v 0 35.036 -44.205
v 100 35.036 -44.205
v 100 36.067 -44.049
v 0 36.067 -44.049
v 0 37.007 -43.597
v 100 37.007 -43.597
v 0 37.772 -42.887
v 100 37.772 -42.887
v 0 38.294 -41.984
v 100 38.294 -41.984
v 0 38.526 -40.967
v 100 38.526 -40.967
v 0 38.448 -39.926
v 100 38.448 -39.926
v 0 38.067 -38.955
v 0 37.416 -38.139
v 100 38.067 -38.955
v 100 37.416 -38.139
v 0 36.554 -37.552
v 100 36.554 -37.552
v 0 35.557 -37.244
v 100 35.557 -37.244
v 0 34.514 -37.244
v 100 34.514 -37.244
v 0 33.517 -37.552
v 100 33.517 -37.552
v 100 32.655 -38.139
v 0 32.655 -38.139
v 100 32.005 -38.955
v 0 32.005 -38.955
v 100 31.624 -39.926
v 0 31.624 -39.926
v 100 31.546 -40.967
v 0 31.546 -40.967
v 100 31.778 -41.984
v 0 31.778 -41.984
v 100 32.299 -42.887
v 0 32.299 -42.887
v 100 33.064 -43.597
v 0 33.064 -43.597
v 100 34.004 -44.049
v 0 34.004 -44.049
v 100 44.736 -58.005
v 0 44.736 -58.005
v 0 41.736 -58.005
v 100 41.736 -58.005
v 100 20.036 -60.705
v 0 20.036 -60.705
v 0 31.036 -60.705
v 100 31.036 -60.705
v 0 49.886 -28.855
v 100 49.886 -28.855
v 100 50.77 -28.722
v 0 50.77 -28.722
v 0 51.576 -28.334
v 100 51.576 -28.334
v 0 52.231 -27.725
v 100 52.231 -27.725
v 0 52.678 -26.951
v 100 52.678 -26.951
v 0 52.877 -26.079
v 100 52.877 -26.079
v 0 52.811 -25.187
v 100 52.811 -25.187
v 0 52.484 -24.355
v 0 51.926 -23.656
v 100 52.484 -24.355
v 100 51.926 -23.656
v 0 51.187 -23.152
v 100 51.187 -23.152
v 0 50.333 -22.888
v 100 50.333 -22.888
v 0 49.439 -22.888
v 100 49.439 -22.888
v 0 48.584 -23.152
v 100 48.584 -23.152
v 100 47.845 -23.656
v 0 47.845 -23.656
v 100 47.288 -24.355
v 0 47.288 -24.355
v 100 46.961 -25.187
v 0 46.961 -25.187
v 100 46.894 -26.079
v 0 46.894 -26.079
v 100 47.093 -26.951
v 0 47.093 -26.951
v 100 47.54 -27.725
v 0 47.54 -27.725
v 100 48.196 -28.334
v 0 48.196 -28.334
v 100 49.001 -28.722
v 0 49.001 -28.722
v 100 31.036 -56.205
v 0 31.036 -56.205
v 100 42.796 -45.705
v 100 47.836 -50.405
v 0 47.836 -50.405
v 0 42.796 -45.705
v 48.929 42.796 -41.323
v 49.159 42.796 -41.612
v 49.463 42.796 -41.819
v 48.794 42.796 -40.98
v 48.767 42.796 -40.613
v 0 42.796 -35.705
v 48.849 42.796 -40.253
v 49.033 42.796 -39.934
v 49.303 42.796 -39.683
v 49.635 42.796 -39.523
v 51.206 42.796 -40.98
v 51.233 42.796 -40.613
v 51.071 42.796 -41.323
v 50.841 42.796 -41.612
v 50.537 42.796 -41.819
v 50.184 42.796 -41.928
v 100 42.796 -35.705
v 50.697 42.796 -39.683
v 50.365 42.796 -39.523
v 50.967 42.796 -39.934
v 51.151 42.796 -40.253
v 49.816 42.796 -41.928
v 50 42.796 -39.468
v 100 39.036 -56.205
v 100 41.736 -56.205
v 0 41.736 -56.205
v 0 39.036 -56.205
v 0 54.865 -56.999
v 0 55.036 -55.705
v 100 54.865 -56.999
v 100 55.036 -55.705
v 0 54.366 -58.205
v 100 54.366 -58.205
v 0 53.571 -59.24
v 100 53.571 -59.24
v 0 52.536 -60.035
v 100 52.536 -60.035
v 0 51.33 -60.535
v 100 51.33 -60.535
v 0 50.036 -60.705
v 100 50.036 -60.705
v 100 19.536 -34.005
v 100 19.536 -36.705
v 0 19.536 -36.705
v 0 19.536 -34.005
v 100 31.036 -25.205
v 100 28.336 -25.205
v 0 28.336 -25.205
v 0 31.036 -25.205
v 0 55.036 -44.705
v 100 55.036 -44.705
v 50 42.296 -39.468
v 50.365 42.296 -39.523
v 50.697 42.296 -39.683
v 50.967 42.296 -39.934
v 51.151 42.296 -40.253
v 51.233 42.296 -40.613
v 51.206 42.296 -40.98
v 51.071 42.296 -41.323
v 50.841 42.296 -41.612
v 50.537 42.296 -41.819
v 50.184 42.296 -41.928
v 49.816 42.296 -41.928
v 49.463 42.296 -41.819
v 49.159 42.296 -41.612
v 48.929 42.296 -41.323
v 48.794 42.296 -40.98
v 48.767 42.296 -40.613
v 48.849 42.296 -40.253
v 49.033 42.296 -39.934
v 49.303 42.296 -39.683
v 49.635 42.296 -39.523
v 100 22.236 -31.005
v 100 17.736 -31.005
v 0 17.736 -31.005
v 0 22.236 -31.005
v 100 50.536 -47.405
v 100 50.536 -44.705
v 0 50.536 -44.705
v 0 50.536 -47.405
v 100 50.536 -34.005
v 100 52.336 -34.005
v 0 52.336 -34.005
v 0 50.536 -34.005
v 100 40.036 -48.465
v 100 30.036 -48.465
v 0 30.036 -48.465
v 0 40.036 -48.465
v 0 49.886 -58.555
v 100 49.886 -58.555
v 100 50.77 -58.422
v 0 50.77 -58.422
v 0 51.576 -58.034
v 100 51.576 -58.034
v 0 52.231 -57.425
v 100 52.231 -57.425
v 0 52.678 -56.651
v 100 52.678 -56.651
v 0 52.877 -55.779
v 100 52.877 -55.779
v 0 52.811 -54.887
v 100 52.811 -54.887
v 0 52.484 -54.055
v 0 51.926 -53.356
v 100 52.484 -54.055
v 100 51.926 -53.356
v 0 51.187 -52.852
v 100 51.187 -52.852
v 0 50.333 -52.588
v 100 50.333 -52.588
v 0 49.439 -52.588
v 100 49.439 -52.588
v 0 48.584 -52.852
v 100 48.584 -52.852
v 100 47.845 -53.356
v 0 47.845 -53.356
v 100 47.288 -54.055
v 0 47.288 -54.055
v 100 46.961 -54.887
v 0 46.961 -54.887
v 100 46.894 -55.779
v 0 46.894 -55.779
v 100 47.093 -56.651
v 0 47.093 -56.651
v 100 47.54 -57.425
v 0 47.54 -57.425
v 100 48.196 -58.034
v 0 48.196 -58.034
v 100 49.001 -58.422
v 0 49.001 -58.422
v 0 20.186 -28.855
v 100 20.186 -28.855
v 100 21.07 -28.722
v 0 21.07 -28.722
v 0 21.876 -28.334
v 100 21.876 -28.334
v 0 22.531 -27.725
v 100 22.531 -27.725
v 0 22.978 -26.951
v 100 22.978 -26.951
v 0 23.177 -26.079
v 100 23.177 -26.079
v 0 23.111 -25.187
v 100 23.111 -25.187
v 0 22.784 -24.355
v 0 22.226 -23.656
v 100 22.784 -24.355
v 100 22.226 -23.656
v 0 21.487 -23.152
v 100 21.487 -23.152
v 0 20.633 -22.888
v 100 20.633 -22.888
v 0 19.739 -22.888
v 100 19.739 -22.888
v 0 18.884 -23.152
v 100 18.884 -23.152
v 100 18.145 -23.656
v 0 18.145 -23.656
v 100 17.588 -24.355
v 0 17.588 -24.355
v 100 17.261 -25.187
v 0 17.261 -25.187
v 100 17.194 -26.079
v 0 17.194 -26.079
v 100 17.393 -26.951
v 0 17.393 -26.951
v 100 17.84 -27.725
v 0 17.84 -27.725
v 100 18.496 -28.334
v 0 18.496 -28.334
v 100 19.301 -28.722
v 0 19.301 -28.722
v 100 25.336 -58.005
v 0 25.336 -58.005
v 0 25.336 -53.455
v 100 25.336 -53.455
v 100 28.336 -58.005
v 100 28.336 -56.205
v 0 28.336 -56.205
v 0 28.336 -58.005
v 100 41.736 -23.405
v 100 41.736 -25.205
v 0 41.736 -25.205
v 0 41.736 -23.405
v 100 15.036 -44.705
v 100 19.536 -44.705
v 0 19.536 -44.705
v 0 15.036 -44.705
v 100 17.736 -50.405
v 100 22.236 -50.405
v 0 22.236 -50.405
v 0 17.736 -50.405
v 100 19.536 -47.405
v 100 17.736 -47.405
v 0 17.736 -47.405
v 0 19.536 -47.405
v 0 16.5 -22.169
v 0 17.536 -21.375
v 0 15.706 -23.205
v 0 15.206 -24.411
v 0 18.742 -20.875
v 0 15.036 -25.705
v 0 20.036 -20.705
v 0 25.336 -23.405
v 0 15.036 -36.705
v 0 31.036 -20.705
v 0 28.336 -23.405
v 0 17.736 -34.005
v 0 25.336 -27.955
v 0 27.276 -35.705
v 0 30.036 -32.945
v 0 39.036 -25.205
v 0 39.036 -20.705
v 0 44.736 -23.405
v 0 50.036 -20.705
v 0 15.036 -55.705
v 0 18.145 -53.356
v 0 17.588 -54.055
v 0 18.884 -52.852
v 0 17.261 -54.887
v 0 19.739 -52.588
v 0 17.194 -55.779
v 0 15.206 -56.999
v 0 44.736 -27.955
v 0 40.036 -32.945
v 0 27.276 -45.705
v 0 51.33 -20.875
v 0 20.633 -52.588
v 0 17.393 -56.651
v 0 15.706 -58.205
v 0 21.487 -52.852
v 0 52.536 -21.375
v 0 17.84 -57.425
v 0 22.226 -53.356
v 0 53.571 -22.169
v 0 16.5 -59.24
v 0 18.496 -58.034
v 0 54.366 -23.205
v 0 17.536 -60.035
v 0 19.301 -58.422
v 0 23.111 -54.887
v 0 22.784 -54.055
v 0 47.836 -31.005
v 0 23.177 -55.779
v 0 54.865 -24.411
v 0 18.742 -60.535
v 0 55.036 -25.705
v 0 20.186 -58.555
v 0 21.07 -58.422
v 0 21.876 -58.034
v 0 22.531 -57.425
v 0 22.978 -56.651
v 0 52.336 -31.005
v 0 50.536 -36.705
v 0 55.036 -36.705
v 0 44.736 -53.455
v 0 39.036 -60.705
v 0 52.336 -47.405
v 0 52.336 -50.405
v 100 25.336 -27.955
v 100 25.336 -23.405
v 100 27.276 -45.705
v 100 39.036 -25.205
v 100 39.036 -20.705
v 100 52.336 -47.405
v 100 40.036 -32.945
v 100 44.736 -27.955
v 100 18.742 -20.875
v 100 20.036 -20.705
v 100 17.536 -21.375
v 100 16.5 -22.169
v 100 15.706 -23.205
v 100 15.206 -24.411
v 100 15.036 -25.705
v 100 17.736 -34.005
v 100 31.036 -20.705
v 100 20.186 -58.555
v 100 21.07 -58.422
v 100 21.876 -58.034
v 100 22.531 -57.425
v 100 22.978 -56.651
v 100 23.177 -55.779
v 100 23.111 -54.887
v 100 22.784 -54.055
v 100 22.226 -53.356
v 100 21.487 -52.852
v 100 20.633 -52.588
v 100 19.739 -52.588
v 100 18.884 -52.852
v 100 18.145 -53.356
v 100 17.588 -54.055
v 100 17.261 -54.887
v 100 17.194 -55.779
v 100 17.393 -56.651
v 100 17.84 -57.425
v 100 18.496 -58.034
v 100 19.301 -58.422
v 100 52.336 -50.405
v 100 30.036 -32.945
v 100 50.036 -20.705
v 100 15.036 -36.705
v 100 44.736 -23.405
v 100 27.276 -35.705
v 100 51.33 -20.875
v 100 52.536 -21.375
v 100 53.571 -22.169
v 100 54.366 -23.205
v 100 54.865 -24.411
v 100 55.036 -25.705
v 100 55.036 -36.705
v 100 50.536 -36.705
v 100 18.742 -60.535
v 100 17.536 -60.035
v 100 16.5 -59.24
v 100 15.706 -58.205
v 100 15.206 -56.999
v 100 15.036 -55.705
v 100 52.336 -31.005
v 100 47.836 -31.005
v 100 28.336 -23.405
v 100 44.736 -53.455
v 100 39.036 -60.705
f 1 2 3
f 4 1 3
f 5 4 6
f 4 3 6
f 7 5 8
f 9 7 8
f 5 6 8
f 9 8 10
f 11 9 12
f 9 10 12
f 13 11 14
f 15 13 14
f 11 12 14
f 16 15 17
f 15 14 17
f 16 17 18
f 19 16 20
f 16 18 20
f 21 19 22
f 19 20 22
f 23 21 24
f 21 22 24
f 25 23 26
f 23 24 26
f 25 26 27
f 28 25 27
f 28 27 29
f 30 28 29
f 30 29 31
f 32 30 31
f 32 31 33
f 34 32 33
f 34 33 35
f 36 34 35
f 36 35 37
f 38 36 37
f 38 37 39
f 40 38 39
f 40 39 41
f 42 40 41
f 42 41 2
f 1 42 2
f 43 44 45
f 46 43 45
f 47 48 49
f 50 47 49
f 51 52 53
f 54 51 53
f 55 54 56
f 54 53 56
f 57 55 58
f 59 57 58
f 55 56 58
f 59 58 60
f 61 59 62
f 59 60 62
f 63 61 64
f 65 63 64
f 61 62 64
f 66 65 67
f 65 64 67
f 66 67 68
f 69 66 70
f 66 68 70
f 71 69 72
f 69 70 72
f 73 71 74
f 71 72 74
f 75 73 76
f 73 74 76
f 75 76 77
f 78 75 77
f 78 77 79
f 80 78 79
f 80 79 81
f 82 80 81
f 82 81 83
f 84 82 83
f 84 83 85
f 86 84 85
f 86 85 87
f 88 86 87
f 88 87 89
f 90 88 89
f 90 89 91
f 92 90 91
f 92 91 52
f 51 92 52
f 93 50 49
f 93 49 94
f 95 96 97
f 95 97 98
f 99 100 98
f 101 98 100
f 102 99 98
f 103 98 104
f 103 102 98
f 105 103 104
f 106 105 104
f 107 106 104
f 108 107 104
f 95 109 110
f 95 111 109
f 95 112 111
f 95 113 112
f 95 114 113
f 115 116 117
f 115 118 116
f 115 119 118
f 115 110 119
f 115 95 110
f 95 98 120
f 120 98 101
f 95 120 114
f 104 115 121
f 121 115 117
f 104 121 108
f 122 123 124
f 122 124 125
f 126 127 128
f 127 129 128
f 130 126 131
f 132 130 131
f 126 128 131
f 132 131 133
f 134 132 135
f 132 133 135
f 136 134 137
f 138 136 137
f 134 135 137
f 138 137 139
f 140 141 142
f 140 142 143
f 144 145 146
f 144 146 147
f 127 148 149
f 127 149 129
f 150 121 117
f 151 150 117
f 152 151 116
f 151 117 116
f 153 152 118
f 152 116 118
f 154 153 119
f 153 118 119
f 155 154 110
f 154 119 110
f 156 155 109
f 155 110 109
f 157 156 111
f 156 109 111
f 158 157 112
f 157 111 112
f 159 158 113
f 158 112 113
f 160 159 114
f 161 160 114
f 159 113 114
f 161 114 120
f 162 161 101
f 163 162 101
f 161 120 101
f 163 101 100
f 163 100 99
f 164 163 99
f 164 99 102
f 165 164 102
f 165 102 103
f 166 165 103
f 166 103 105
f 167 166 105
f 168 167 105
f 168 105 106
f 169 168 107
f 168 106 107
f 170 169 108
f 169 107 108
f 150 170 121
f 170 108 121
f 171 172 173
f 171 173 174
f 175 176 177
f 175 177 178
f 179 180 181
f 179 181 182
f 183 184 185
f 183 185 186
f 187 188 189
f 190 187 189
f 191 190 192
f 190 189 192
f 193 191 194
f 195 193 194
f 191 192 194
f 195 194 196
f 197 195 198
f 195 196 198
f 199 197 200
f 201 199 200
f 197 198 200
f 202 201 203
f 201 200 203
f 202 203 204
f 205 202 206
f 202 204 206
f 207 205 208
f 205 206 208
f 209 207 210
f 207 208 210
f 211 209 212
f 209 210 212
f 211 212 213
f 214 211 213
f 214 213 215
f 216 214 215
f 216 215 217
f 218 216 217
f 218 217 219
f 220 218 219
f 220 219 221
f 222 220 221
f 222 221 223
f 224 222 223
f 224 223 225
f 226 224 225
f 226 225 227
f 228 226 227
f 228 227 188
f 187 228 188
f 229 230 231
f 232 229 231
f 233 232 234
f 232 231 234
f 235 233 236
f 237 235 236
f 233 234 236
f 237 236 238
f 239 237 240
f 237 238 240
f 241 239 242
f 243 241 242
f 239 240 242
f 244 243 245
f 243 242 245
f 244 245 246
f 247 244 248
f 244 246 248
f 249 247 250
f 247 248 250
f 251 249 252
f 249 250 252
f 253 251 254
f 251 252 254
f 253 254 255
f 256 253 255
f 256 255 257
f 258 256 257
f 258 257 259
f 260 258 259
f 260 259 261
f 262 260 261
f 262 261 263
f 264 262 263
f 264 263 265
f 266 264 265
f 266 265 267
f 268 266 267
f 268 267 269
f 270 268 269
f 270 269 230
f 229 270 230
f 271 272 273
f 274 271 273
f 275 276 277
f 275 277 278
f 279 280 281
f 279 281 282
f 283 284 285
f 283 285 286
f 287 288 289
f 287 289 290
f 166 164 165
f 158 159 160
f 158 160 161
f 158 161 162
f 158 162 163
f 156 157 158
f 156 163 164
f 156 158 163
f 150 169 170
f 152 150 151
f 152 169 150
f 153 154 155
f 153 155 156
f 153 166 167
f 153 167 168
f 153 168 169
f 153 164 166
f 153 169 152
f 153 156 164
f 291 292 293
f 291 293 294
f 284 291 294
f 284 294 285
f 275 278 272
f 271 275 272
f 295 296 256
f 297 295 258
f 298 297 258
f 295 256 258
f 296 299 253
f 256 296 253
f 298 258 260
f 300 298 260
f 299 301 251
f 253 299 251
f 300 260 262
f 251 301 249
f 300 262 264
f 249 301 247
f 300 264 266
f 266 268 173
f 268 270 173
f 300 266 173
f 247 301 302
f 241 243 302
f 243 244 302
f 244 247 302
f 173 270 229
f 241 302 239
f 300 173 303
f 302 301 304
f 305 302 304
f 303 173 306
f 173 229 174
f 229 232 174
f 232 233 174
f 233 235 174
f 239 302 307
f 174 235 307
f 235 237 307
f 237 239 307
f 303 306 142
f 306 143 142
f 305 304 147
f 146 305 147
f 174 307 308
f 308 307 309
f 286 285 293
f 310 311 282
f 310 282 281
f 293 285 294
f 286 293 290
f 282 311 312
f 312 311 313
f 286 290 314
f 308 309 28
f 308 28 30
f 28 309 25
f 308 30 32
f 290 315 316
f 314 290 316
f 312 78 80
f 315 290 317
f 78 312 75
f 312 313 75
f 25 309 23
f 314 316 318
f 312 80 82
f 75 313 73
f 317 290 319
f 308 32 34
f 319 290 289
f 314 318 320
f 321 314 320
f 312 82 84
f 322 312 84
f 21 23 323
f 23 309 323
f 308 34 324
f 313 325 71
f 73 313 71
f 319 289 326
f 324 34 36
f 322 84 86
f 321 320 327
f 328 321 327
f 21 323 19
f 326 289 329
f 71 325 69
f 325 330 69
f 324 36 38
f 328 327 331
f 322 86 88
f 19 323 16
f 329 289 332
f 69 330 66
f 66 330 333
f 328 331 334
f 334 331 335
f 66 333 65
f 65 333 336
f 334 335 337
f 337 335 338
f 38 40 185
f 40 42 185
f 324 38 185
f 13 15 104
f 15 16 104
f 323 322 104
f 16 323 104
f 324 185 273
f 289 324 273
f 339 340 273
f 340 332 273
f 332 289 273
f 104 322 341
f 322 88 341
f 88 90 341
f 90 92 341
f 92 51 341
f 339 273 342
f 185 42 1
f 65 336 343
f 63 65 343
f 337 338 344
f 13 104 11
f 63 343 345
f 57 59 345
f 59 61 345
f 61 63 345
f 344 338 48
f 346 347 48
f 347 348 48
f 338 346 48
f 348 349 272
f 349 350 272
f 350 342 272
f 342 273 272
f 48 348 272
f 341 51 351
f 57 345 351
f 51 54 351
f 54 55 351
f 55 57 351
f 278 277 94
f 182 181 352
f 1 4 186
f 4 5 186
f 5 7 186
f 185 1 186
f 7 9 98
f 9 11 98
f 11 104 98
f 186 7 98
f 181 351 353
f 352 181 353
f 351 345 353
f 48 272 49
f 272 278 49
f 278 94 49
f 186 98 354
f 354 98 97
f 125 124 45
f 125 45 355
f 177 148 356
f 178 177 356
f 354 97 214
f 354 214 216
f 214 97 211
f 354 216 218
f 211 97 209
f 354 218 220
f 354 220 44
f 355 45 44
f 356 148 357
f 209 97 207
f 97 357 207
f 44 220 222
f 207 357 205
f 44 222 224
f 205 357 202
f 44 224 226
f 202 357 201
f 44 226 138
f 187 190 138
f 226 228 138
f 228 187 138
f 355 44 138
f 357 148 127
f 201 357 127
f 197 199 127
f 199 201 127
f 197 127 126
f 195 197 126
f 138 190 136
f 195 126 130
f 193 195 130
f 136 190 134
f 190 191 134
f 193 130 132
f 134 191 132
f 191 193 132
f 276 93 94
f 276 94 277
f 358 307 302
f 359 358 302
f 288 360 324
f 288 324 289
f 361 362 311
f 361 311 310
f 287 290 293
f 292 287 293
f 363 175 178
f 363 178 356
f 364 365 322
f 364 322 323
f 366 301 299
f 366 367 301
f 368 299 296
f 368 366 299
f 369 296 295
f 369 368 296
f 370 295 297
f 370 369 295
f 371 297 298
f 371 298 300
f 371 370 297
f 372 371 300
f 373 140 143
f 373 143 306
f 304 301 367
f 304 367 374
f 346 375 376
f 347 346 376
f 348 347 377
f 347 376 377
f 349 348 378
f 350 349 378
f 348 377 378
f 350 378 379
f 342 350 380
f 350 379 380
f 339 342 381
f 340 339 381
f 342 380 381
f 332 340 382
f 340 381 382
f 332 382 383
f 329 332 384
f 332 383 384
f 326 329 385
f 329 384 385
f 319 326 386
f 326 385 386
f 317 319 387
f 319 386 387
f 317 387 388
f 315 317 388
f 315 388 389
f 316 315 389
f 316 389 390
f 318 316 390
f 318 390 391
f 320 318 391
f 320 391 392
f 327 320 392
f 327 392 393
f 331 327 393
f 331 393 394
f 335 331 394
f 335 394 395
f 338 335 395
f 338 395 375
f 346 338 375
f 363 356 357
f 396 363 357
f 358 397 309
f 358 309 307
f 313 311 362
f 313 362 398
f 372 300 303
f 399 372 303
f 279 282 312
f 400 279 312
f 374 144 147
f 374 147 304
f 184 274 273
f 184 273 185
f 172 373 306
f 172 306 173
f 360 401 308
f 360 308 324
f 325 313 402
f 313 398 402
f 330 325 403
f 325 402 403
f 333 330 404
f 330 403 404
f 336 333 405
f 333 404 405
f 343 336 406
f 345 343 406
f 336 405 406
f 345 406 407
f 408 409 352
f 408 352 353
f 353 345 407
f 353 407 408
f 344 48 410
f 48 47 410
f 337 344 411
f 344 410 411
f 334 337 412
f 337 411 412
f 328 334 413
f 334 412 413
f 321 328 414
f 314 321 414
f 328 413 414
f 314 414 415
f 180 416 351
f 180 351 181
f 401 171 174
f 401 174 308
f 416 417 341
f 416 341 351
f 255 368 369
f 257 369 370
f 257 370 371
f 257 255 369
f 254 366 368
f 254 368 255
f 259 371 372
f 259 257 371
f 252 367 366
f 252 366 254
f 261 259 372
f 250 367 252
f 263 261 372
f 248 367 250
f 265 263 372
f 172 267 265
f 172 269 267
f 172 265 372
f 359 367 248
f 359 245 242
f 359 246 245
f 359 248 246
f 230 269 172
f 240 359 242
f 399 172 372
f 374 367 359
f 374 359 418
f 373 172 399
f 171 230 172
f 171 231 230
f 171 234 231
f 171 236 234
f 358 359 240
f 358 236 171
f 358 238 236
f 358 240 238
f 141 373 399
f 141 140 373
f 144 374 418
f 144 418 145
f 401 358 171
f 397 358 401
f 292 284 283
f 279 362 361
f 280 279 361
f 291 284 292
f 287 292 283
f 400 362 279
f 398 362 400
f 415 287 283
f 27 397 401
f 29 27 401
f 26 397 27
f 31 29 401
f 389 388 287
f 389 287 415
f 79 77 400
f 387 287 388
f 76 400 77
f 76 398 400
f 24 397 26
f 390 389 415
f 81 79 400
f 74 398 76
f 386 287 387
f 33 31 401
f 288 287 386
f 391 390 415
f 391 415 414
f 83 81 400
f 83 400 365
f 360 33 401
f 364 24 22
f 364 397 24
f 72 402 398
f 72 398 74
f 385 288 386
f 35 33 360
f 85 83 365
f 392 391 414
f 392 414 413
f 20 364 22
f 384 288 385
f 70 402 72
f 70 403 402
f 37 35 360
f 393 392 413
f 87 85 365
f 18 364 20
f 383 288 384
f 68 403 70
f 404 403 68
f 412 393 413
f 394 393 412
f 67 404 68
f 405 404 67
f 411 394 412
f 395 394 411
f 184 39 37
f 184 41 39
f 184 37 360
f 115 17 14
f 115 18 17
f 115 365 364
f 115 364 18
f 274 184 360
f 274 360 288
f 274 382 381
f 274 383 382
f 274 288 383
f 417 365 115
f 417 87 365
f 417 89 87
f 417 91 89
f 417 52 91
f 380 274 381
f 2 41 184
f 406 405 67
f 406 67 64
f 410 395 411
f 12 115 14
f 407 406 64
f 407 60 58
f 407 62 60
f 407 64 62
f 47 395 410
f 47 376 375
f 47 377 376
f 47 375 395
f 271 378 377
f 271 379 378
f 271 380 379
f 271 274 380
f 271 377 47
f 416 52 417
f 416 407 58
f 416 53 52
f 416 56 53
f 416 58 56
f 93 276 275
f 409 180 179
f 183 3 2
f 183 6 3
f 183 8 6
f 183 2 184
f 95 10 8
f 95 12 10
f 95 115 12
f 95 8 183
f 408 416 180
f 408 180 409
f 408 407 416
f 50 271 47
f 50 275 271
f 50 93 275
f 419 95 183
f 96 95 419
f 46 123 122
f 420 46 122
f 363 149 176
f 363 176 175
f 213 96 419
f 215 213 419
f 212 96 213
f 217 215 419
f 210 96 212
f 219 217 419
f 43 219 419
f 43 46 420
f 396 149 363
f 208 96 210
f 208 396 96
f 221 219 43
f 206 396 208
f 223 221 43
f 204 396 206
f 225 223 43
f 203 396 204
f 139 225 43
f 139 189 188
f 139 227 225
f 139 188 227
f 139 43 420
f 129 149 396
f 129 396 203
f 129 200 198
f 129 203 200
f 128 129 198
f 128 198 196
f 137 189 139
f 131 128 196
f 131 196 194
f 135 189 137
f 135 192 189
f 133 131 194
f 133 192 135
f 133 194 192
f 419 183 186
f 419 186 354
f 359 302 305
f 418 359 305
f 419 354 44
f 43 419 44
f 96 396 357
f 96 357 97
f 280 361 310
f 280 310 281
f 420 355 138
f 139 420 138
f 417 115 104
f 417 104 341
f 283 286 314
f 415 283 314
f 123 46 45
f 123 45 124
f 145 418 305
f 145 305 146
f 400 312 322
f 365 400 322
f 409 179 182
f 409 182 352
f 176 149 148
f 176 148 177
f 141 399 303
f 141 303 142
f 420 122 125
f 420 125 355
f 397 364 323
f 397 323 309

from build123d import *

# Parameters (mm, degrees)
SKETCH_1_W          = 40
SKETCH_1_H          = 40
EXTRUDE_1_DEPTH     = 100
CUT_EXTRUDE_1_REACH = 131.283
SKETCH_2_R          = 3.5
SKETCH_2_R_2        = 3
FILLET_1_R          = 5
SKETCH_3_R          = 1.236693346
CUT_EXTRUDE_2_DEPTH = 0.5


with BuildPart() as part:
    # 草图1 → 凸台-拉伸1 (new body)
    with BuildSketch(Plane(origin=(0, 0, 0), x_dir=(0, 0, -1), z_dir=(1, 0, 0))):
        with Locations((40.704960836, 35.035758607)):
            Rectangle(SKETCH_1_W, SKETCH_1_H)
    extrude(amount=EXTRUDE_1_DEPTH)

    # 草图2 → 切除-拉伸1 (cut, up to next)
    with BuildSketch(Plane(origin=(100, 0, 0), x_dir=(0, 0, -1), z_dir=(1, 0, 0)), mode=Mode.PRIVATE) as cut_extrude_1_sk1:
        with Locations((40.704960836, 35.035758607)):
            Circle(SKETCH_2_R)
    cut_extrude_1_tool1 = extrude(cut_extrude_1_sk1.sketch, amount=-CUT_EXTRUDE_1_REACH, mode=Mode.PRIVATE) & part.part
    # 草图2 → 切除-拉伸1 (cut, up to next)
    with BuildSketch(Plane(origin=(100, 0, 0), x_dir=(0, 0, -1), z_dir=(1, 0, 0)), mode=Mode.PRIVATE) as cut_extrude_1_sk2:
        with Locations((25.854960836, 49.885758607)):
            Circle(SKETCH_2_R_2)
    cut_extrude_1_tool2 = extrude(cut_extrude_1_sk2.sketch, amount=-CUT_EXTRUDE_1_REACH, mode=Mode.PRIVATE) & part.part
    # 草图2 → 切除-拉伸1 (cut, up to next)
    with BuildSketch(Plane(origin=(100, 0, 0), x_dir=(0, 0, -1), z_dir=(1, 0, 0)), mode=Mode.PRIVATE) as cut_extrude_1_sk3:
        with Locations((25.854960836, 20.185758607)):
            Circle(SKETCH_2_R_2)
    cut_extrude_1_tool3 = extrude(cut_extrude_1_sk3.sketch, amount=-CUT_EXTRUDE_1_REACH, mode=Mode.PRIVATE) & part.part
    # 草图2 → 切除-拉伸1 (cut, up to next)
    with BuildSketch(Plane(origin=(100, 0, 0), x_dir=(0, 0, -1), z_dir=(1, 0, 0)), mode=Mode.PRIVATE) as cut_extrude_1_sk4:
        with Locations((55.554960836, 49.885758607)):
            Circle(SKETCH_2_R_2)
    cut_extrude_1_tool4 = extrude(cut_extrude_1_sk4.sketch, amount=-CUT_EXTRUDE_1_REACH, mode=Mode.PRIVATE) & part.part
    # 草图2 → 切除-拉伸1 (cut, up to next)
    with BuildSketch(Plane(origin=(100, 0, 0), x_dir=(0, 0, -1), z_dir=(1, 0, 0)), mode=Mode.PRIVATE) as cut_extrude_1_sk5:
        with Locations((55.554960836, 20.185758607)):
            Circle(SKETCH_2_R_2)
    cut_extrude_1_tool5 = extrude(cut_extrude_1_sk5.sketch, amount=-CUT_EXTRUDE_1_REACH, mode=Mode.PRIVATE) & part.part
    # 草图2 → 切除-拉伸1 (cut, up to next)
    with BuildSketch(Plane(origin=(100, 0, 0), x_dir=(0, 0, -1), z_dir=(1, 0, 0)), mode=Mode.PRIVATE) as cut_extrude_1_sk6:
        Polygon((36.704960836, 15.035758607), (36.704960836, 19.535758607), (34.004960836, 19.535758607), (34.004960836, 17.735758607), (31.004960836, 17.735758607), (31.004960836, 22.235758607), (35.704960836, 27.275758607), (45.704960836, 27.275758607), (50.404960836, 22.235758607), (50.404960836, 17.735758607), (47.404960836, 17.735758607), (47.404960836, 19.535758607), (44.704960836, 19.535758607), (44.704960836, 15.035758607), align=None)
    cut_extrude_1_tool6 = extrude(cut_extrude_1_sk6.sketch, amount=-CUT_EXTRUDE_1_REACH, mode=Mode.PRIVATE) & part.part
    # 草图2 → 切除-拉伸1 (cut, up to next)
    with BuildSketch(Plane(origin=(100, 0, 0), x_dir=(0, 0, -1), z_dir=(1, 0, 0)), mode=Mode.PRIVATE) as cut_extrude_1_sk7:
        Polygon((44.704960836, 55.035758607), (44.704960836, 50.535758607), (47.404960836, 50.535758607), (47.404960836, 52.335758607), (50.404960836, 52.335758607), (50.404960836, 47.835758607), (45.704960836, 42.795758607), (35.704960836, 42.795758607), (31.004960836, 47.835758607), (31.004960836, 52.335758607), (34.004960836, 52.335758607), (34.004960836, 50.535758607), (36.704960836, 50.535758607), (36.704960836, 55.035758607), align=None)
    cut_extrude_1_tool7 = extrude(cut_extrude_1_sk7.sketch, amount=-CUT_EXTRUDE_1_REACH, mode=Mode.PRIVATE) & part.part
    # 草图2 → 切除-拉伸1 (cut, up to next)
    with BuildSketch(Plane(origin=(100, 0, 0), x_dir=(0, 0, -1), z_dir=(1, 0, 0)), mode=Mode.PRIVATE) as cut_extrude_1_sk8:
        Polygon((20.704960836, 31.035758607), (20.704960836, 39.035758607), (25.204960836, 39.035758607), (25.204960836, 41.735758607), (23.404960836, 41.735758607), (23.404960836, 44.735758607), (27.954960836, 44.735758607), (32.944960836, 40.035758607), (32.944960836, 30.035758607), (27.954960836, 25.335758607), (23.404960836, 25.335758607), (23.404960836, 28.335758607), (25.204960836, 28.335758607), (25.204960836, 31.035758607), align=None)
    cut_extrude_1_tool8 = extrude(cut_extrude_1_sk8.sketch, amount=-CUT_EXTRUDE_1_REACH, mode=Mode.PRIVATE) & part.part
    # 草图2 → 切除-拉伸1 (cut, up to next)
    with BuildSketch(Plane(origin=(100, 0, 0), x_dir=(0, 0, -1), z_dir=(1, 0, 0)), mode=Mode.PRIVATE) as cut_extrude_1_sk9:
        Polygon((60.704960836, 31.035758607), (56.204960836, 31.035758607), (56.204960836, 28.335758607), (58.004960836, 28.335758607), (58.004960836, 25.335758607), (53.454960836, 25.335758607), (48.464960836, 30.035758607), (48.464960836, 40.035758607), (53.454960836, 44.735758607), (58.004960836, 44.735758607), (58.004960836, 41.735758607), (56.204960836, 41.735758607), (56.204960836, 39.035758607), (60.704960836, 39.035758607), align=None)
    cut_extrude_1_tool9 = extrude(cut_extrude_1_sk9.sketch, amount=-CUT_EXTRUDE_1_REACH, mode=Mode.PRIVATE) & part.part
    add(cut_extrude_1_tool1.solids().sort_by_distance((100, 35.035759, -40.704961))[0], mode=Mode.SUBTRACT)
    add(cut_extrude_1_tool2.solids().sort_by_distance((100, 49.885759, -25.854961))[0], mode=Mode.SUBTRACT)
    add(cut_extrude_1_tool3.solids().sort_by_distance((100, 20.185759, -25.854961))[0], mode=Mode.SUBTRACT)
    add(cut_extrude_1_tool4.solids().sort_by_distance((100, 49.885759, -55.554961))[0], mode=Mode.SUBTRACT)
    add(cut_extrude_1_tool5.solids().sort_by_distance((100, 20.185759, -55.554961))[0], mode=Mode.SUBTRACT)
    add(cut_extrude_1_tool6.solids().sort_by_distance((100, 21.537481, -40.704961))[0], mode=Mode.SUBTRACT)
    add(cut_extrude_1_tool7.solids().sort_by_distance((100, 48.534036, -40.704961))[0], mode=Mode.SUBTRACT)
    add(cut_extrude_1_tool8.solids().sort_by_distance((100, 35.035759, -27.209927))[0], mode=Mode.SUBTRACT)
    add(cut_extrude_1_tool9.solids().sort_by_distance((100, 35.035759, -54.199995))[0], mode=Mode.SUBTRACT)

    # 圆角1
    fillet_1_edges = [part.edges().sort_by_distance(p)[0] for p in [
        (50, 55.035758607, -20.704960836),
        (50, 55.035758607, -60.704960836),
        (50, 15.035758607, -60.704960836),
        (50, 15.035758607, -20.704960836),
    ]]
    fillet(fillet_1_edges, radius=FILLET_1_R)

    # 草图3 → 切除-拉伸2 (cut)
    with BuildSketch(Plane(origin=(0, 42.795758607, 0), x_dir=(1, 0, 0), z_dir=(0, 1, 0))):
        with Locations(Location((50, 40.704960836, 0), (0, 0, 270))):
            Circle(SKETCH_3_R)
    extrude(amount=-CUT_EXTRUDE_2_DEPTH, mode=Mode.SUBTRACT)


solid = part.part
